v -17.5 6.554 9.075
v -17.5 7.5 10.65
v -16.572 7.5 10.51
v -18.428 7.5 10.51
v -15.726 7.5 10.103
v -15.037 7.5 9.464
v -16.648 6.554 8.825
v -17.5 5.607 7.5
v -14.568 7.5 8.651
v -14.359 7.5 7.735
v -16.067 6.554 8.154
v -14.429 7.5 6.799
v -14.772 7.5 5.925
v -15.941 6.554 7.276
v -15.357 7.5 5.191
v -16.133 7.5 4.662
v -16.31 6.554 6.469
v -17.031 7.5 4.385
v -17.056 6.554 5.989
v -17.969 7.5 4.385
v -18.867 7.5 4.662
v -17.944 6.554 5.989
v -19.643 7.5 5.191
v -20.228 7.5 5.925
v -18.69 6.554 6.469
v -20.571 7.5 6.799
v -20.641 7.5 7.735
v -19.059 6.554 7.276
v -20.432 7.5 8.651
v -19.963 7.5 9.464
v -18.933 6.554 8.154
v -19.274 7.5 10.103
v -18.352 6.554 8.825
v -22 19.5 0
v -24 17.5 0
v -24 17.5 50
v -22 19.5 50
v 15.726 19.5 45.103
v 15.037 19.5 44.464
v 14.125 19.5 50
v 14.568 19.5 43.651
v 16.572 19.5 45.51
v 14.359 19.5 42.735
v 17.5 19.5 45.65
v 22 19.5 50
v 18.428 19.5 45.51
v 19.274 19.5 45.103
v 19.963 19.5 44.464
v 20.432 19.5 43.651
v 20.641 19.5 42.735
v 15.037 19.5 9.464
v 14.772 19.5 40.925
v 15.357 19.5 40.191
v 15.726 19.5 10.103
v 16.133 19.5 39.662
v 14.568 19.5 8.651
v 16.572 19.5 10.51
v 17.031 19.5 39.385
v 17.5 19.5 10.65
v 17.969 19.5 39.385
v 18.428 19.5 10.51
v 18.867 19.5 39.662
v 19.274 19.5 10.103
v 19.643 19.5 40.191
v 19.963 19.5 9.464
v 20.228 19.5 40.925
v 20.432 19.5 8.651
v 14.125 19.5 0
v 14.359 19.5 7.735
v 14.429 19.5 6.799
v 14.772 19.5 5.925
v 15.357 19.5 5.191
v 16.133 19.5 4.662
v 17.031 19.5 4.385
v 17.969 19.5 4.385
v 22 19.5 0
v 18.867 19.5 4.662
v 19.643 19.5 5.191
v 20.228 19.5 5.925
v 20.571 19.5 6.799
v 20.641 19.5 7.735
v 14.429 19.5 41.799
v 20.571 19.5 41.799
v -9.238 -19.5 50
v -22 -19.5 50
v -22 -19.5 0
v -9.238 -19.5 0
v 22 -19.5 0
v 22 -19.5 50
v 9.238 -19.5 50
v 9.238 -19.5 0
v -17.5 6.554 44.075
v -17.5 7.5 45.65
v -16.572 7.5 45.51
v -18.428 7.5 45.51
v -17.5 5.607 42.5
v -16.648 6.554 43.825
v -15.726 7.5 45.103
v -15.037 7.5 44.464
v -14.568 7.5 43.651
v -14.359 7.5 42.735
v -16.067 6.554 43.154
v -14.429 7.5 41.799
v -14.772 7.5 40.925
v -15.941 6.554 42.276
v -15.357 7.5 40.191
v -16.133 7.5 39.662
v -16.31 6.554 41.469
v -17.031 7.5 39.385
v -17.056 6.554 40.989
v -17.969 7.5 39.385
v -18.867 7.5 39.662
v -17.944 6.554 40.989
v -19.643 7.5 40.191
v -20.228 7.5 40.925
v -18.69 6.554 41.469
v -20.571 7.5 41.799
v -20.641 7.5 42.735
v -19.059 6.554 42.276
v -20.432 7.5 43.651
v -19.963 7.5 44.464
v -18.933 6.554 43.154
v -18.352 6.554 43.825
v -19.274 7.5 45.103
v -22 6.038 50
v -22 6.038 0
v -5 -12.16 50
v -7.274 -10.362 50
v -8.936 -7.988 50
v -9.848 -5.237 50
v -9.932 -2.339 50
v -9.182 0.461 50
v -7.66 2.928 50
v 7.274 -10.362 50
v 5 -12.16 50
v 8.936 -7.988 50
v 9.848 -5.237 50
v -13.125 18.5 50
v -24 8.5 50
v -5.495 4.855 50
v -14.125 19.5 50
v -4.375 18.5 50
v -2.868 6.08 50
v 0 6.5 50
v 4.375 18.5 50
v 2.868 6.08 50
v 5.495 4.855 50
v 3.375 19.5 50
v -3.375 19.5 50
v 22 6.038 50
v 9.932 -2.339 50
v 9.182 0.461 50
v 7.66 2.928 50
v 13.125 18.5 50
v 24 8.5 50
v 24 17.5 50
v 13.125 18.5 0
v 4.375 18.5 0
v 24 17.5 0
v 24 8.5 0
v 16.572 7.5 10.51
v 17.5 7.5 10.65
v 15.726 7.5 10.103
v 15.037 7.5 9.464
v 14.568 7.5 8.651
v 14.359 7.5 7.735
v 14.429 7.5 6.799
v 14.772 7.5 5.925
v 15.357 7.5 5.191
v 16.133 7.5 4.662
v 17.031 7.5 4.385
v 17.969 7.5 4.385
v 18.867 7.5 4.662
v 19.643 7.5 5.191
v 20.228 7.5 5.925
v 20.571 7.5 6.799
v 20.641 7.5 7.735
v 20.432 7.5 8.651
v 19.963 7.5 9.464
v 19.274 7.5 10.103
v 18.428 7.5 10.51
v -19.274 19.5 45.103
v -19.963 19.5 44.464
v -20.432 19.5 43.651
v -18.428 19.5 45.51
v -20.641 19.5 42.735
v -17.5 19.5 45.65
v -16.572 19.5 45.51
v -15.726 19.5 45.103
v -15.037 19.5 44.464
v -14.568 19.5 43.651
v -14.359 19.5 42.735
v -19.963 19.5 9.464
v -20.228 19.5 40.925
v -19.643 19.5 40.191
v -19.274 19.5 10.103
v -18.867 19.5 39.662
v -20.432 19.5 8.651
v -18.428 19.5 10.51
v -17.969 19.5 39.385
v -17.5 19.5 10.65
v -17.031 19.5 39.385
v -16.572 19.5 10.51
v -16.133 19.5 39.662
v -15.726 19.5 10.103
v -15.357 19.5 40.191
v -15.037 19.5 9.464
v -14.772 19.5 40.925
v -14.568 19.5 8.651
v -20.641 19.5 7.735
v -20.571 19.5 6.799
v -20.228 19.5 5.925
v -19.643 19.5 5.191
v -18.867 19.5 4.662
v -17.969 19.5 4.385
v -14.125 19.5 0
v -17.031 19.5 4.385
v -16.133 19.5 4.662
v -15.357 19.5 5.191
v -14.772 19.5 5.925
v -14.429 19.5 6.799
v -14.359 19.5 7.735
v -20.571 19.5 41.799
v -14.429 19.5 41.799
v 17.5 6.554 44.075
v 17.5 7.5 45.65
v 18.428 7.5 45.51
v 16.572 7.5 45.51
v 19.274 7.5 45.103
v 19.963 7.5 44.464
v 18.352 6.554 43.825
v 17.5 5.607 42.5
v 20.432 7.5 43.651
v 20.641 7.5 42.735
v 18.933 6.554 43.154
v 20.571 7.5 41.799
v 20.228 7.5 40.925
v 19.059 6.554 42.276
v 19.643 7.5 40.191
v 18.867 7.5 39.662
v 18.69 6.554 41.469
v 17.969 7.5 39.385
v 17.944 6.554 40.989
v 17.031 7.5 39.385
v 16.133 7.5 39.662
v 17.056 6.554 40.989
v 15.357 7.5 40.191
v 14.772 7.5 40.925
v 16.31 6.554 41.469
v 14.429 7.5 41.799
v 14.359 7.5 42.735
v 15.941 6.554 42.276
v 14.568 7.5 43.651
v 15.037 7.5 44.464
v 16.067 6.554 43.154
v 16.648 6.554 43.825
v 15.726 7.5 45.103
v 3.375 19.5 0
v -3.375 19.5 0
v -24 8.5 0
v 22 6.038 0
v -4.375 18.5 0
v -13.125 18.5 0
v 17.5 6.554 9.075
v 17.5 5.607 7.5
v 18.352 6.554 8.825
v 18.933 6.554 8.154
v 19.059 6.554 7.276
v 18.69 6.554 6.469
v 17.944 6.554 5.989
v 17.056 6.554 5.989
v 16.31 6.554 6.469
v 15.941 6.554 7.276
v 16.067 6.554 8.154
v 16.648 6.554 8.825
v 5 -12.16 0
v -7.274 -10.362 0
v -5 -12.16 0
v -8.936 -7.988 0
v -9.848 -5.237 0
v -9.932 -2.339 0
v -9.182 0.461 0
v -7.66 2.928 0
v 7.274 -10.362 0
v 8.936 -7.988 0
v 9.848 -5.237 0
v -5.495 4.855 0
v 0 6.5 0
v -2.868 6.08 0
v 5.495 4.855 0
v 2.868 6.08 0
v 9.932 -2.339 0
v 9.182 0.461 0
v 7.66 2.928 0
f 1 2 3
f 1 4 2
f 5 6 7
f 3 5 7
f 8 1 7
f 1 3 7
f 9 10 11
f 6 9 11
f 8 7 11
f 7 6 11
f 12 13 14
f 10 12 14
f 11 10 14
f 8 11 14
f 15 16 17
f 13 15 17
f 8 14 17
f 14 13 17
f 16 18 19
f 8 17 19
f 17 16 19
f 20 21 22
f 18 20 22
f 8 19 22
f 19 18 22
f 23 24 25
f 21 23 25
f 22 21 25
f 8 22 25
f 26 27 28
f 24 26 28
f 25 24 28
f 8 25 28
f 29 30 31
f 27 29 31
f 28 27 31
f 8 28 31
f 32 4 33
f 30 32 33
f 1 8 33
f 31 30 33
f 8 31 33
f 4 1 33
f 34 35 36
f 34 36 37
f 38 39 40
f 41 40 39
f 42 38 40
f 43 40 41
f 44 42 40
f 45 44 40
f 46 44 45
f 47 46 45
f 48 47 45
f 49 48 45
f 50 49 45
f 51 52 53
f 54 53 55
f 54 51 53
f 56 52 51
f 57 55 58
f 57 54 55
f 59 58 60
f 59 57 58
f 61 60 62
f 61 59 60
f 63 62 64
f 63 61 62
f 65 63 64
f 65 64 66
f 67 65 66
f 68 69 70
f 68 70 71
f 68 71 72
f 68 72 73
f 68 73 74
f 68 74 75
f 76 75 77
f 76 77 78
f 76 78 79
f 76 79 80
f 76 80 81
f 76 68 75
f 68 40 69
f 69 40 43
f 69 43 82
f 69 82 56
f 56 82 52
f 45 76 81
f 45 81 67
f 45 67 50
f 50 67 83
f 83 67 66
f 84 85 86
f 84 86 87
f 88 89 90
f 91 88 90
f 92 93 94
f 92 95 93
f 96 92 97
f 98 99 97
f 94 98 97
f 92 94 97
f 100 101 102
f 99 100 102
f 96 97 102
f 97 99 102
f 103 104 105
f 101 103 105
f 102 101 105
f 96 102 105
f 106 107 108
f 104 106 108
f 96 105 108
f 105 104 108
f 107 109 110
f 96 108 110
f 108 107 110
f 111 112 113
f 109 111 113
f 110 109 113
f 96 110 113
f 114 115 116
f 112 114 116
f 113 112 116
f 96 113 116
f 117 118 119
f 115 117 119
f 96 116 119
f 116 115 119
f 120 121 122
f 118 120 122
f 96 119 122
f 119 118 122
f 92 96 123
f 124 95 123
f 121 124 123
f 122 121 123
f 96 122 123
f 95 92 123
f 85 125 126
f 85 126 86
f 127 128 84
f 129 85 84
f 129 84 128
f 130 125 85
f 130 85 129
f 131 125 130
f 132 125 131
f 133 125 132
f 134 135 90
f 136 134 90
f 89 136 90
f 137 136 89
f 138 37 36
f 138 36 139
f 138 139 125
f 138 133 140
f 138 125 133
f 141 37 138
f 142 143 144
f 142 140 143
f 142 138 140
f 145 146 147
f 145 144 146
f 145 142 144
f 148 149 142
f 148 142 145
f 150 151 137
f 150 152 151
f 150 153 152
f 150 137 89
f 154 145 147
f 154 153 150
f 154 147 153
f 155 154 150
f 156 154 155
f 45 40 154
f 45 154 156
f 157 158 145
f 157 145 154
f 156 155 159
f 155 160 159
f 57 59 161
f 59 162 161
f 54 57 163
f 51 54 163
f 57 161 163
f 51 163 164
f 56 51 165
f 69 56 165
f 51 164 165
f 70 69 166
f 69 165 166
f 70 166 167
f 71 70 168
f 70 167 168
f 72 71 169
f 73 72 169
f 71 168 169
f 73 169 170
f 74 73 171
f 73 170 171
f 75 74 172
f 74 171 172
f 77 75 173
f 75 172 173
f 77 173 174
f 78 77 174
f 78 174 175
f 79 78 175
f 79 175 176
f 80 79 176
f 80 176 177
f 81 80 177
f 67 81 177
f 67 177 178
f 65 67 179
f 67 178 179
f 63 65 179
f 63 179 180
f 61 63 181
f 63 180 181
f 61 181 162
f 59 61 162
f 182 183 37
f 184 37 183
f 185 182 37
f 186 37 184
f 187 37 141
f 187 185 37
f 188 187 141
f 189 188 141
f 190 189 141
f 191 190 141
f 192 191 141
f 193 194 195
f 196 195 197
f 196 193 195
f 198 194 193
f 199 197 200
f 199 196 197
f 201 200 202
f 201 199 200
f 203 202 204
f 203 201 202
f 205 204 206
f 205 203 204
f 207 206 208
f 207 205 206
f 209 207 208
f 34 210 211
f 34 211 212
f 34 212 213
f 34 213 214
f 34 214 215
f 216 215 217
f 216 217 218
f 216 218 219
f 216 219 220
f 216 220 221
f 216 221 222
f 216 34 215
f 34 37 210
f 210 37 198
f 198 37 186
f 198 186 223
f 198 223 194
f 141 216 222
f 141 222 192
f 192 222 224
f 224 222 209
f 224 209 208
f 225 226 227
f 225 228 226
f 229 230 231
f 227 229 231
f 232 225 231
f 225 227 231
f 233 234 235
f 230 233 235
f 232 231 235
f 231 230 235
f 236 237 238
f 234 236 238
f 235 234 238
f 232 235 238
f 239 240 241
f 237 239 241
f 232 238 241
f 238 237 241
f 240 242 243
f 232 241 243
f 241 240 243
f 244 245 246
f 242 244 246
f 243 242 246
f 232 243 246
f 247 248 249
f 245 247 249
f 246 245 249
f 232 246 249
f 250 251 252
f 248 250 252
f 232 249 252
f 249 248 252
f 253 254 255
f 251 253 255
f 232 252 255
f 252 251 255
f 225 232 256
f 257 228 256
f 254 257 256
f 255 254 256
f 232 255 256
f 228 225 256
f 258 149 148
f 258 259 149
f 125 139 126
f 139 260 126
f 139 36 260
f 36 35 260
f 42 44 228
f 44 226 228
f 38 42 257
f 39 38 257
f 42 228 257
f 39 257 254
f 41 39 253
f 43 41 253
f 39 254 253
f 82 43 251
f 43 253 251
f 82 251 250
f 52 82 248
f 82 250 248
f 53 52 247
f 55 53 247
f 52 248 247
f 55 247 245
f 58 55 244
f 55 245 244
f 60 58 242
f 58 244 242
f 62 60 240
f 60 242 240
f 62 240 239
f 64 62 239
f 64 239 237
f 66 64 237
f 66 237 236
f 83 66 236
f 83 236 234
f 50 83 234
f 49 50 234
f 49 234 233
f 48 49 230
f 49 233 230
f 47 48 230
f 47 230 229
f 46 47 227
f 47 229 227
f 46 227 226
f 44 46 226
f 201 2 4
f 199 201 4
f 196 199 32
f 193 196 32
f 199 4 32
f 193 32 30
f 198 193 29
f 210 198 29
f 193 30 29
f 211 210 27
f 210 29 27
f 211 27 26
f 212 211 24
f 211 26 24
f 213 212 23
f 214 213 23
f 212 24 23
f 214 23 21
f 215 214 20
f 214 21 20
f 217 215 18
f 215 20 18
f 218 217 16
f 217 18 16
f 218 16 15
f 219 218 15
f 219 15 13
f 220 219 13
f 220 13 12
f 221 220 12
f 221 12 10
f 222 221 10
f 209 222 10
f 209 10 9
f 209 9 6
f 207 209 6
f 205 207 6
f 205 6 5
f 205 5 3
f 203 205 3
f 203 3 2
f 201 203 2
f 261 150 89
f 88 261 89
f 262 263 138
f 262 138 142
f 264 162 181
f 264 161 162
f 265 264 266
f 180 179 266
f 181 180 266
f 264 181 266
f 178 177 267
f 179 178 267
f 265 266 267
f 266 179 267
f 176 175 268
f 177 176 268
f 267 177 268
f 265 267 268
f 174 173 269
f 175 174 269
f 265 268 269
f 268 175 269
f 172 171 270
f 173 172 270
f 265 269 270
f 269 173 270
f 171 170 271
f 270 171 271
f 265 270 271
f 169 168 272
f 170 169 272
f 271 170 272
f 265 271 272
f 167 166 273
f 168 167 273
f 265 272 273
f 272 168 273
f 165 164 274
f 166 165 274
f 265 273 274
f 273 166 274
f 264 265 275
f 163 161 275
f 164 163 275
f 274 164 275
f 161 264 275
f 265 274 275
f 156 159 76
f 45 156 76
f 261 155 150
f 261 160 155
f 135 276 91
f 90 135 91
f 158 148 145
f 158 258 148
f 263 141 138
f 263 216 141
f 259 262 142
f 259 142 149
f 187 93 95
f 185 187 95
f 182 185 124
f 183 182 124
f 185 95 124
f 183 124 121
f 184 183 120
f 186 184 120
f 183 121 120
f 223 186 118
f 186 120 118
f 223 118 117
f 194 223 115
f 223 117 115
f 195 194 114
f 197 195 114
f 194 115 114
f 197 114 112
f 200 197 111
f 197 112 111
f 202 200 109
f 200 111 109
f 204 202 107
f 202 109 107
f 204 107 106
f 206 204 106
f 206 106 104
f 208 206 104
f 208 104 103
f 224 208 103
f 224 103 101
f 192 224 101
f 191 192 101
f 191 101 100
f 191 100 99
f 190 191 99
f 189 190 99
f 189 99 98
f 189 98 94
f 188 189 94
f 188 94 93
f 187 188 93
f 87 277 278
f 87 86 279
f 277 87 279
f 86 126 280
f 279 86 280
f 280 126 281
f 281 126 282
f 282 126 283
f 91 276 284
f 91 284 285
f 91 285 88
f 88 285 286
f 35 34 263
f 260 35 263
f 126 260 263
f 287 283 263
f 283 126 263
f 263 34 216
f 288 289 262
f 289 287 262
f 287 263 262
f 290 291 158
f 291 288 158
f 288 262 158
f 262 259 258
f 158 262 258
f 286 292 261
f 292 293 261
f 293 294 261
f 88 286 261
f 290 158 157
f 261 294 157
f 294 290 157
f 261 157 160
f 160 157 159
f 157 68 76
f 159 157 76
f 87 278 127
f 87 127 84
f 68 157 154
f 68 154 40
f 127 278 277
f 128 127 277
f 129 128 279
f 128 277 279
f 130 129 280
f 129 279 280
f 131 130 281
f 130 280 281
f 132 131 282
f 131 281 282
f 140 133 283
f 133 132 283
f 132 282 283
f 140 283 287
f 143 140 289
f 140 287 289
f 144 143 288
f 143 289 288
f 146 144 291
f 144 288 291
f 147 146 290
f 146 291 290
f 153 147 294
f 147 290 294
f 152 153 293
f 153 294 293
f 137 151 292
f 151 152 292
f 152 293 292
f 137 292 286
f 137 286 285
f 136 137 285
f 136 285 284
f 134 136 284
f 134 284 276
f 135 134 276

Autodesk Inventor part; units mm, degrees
ref_plane "YZ Plane" through (0, 0, 0) normal (1, 0, 0) x (0, 1, 0)
ref_plane "XZ Plane" through (0, 0, 0) normal (0, 1, 0) x (-1, 0, 0)
sketch "Sketch2" plane through (0, 0, 0) normal (0, 0, 1) x (1, 0, 0)
  arc A0 (5, -12.1603) -> (-5, -12.1603) centre (0, -3.5) ccw
  line L0 (-5, -12.1603) -> (5, -12.1603) construction
  line L1 (5, -12.1603) -> (9.2376, -19.5)
  line L2 (-5, -12.1603) -> (-9.2376, -19.5)
  line L3 (-24, 8.5) -> (-22, 6.0385)
  line L4 (-22, 6.0385) -> (-22, -19.5)
  line L5 (24, 8.5) -> (22, 6.0385)
  line L6 (-22, -19.5) -> (-9.2376, -19.5)
  line L7 (22, 6.0385) -> (22, -19.5)
  line L8 (22, -19.5) -> (9.2376, -19.5)
  line L9 (-24, 17.5) -> (-22, 19.5)
  line L10 (-24, 17.5) -> (-24, 8.5)
  line L11 (24, 8.5) -> (24, 17.5)
  line L12 (24, 17.5) -> (22, 19.5)
  line L13 (-22, 19.5) -> (-14.125, 19.5)
  line L14 (-14.125, 19.5) -> (-13.125, 18.5)
  line L15 (-13.125, 18.5) -> (-4.375, 18.5)
  line L16 (-4.375, 18.5) -> (-3.375, 19.5)
  line L17 (-3.375, 19.5) -> (3.375, 19.5)
  line L18 (3.375, 19.5) -> (4.375, 18.5)
  line L19 (4.375, 18.5) -> (13.125, 18.5)
  line L20 (13.125, 18.5) -> (14.125, 19.5)
  line L21 (14.125, 19.5) -> (22, 19.5)
  point P0 (0, 0)
  point P1 (0, 0)
  point P2 (0, 0)
  dimension "h1" = 10
  dimension "r1" = 10
  dimension "d15" = 2
  dimension "d16" = 2
  dimension "d18" = 25.5385
  dimension "d19" = 25.5385
  dimension "d20" = 12.7624
  dimension "d21" = 12.7624
  dimension "d22" = 7.3398
  dimension "d23" = 7.3398
  dimension "d24" = 2.4615
  dimension "d25" = 2.4615
  dimension "d26" = 3.5
  dimension "d27" = 18.4752
  dimension "d28" = 22
  dimension "d33" = 2
  dimension "d34" = 2
  dimension "d35" = 9
  dimension "d36" = 2
  dimension "d37" = 44
  dimension "d38" = 9
  dimension "d40" = 1
  dimension "d41" = 8.75
  dimension "d42" = 8.75
  dimension "d43" = 6.75
  dimension "d44" = 1
  dimension "d45" = 1
  dimension "d46" = 1
  dimension "d47" = 7.875
  dimension "d48" = 7.875
extrude "Extrusion1" add sketch "Sketch2" along normal blind 50
ref_plane "Work Plane1" through (-3.375, 19.5, 0) normal (0, 1, 0) x (1, 0, 0)
sketch "Sketch3" plane through (-3.375, 19.5, 0) normal (0, 1, 0) x (1, 0, 0)
  line L0 (-20.625, 0) -> (3.375, 0) construction
  line L1 (-20.625, 0) -> (-20.625, -15.5497) construction
  line L2 (27.375, 0) -> (27.375, -50) construction
  line L3 (-18.625, 0) -> (-18.625, -50) construction
  line L4 (25.375, 0) -> (25.375, -50) construction
  point P0 (-14.125, -7.5)
  point P1 (20.875, -7.5)
  point P2 (-14.125, -42.5)
  point P3 (20.875, -42.5)
  dimension "d52" = 35
  dimension "d55" = 35
  dimension "d58" = 7.5
  dimension "d68" = 2
  dimension "d69" = 4.5
  dimension "d70" = 2
  dimension "d71" = 4.5
hole "Hole1" at (-17.5, 19.5, 7.5) at (17.5, 19.5, 7.5) at (-17.5, 19.5, 42.5) at (17.5, 19.5, 42.5) direction (0, -1, 0) diameter 6.3 depth 12 tip angle 118
equation "\"d16\" = d15"
equation "\"d19\" = d18"
equation "\"d21\" = d20"
equation "\"d23\" = d22"
equation "\"d25\" = d24"
equation "\"d34\" = d33"
equation "\"d42\" = d41"
equation "\"d44\" = d40"
equation "\"d45\" = d40"
equation "\"d46\" = d40"
equation "\"d48\" = d47"
properties part number "sbr20uu"
